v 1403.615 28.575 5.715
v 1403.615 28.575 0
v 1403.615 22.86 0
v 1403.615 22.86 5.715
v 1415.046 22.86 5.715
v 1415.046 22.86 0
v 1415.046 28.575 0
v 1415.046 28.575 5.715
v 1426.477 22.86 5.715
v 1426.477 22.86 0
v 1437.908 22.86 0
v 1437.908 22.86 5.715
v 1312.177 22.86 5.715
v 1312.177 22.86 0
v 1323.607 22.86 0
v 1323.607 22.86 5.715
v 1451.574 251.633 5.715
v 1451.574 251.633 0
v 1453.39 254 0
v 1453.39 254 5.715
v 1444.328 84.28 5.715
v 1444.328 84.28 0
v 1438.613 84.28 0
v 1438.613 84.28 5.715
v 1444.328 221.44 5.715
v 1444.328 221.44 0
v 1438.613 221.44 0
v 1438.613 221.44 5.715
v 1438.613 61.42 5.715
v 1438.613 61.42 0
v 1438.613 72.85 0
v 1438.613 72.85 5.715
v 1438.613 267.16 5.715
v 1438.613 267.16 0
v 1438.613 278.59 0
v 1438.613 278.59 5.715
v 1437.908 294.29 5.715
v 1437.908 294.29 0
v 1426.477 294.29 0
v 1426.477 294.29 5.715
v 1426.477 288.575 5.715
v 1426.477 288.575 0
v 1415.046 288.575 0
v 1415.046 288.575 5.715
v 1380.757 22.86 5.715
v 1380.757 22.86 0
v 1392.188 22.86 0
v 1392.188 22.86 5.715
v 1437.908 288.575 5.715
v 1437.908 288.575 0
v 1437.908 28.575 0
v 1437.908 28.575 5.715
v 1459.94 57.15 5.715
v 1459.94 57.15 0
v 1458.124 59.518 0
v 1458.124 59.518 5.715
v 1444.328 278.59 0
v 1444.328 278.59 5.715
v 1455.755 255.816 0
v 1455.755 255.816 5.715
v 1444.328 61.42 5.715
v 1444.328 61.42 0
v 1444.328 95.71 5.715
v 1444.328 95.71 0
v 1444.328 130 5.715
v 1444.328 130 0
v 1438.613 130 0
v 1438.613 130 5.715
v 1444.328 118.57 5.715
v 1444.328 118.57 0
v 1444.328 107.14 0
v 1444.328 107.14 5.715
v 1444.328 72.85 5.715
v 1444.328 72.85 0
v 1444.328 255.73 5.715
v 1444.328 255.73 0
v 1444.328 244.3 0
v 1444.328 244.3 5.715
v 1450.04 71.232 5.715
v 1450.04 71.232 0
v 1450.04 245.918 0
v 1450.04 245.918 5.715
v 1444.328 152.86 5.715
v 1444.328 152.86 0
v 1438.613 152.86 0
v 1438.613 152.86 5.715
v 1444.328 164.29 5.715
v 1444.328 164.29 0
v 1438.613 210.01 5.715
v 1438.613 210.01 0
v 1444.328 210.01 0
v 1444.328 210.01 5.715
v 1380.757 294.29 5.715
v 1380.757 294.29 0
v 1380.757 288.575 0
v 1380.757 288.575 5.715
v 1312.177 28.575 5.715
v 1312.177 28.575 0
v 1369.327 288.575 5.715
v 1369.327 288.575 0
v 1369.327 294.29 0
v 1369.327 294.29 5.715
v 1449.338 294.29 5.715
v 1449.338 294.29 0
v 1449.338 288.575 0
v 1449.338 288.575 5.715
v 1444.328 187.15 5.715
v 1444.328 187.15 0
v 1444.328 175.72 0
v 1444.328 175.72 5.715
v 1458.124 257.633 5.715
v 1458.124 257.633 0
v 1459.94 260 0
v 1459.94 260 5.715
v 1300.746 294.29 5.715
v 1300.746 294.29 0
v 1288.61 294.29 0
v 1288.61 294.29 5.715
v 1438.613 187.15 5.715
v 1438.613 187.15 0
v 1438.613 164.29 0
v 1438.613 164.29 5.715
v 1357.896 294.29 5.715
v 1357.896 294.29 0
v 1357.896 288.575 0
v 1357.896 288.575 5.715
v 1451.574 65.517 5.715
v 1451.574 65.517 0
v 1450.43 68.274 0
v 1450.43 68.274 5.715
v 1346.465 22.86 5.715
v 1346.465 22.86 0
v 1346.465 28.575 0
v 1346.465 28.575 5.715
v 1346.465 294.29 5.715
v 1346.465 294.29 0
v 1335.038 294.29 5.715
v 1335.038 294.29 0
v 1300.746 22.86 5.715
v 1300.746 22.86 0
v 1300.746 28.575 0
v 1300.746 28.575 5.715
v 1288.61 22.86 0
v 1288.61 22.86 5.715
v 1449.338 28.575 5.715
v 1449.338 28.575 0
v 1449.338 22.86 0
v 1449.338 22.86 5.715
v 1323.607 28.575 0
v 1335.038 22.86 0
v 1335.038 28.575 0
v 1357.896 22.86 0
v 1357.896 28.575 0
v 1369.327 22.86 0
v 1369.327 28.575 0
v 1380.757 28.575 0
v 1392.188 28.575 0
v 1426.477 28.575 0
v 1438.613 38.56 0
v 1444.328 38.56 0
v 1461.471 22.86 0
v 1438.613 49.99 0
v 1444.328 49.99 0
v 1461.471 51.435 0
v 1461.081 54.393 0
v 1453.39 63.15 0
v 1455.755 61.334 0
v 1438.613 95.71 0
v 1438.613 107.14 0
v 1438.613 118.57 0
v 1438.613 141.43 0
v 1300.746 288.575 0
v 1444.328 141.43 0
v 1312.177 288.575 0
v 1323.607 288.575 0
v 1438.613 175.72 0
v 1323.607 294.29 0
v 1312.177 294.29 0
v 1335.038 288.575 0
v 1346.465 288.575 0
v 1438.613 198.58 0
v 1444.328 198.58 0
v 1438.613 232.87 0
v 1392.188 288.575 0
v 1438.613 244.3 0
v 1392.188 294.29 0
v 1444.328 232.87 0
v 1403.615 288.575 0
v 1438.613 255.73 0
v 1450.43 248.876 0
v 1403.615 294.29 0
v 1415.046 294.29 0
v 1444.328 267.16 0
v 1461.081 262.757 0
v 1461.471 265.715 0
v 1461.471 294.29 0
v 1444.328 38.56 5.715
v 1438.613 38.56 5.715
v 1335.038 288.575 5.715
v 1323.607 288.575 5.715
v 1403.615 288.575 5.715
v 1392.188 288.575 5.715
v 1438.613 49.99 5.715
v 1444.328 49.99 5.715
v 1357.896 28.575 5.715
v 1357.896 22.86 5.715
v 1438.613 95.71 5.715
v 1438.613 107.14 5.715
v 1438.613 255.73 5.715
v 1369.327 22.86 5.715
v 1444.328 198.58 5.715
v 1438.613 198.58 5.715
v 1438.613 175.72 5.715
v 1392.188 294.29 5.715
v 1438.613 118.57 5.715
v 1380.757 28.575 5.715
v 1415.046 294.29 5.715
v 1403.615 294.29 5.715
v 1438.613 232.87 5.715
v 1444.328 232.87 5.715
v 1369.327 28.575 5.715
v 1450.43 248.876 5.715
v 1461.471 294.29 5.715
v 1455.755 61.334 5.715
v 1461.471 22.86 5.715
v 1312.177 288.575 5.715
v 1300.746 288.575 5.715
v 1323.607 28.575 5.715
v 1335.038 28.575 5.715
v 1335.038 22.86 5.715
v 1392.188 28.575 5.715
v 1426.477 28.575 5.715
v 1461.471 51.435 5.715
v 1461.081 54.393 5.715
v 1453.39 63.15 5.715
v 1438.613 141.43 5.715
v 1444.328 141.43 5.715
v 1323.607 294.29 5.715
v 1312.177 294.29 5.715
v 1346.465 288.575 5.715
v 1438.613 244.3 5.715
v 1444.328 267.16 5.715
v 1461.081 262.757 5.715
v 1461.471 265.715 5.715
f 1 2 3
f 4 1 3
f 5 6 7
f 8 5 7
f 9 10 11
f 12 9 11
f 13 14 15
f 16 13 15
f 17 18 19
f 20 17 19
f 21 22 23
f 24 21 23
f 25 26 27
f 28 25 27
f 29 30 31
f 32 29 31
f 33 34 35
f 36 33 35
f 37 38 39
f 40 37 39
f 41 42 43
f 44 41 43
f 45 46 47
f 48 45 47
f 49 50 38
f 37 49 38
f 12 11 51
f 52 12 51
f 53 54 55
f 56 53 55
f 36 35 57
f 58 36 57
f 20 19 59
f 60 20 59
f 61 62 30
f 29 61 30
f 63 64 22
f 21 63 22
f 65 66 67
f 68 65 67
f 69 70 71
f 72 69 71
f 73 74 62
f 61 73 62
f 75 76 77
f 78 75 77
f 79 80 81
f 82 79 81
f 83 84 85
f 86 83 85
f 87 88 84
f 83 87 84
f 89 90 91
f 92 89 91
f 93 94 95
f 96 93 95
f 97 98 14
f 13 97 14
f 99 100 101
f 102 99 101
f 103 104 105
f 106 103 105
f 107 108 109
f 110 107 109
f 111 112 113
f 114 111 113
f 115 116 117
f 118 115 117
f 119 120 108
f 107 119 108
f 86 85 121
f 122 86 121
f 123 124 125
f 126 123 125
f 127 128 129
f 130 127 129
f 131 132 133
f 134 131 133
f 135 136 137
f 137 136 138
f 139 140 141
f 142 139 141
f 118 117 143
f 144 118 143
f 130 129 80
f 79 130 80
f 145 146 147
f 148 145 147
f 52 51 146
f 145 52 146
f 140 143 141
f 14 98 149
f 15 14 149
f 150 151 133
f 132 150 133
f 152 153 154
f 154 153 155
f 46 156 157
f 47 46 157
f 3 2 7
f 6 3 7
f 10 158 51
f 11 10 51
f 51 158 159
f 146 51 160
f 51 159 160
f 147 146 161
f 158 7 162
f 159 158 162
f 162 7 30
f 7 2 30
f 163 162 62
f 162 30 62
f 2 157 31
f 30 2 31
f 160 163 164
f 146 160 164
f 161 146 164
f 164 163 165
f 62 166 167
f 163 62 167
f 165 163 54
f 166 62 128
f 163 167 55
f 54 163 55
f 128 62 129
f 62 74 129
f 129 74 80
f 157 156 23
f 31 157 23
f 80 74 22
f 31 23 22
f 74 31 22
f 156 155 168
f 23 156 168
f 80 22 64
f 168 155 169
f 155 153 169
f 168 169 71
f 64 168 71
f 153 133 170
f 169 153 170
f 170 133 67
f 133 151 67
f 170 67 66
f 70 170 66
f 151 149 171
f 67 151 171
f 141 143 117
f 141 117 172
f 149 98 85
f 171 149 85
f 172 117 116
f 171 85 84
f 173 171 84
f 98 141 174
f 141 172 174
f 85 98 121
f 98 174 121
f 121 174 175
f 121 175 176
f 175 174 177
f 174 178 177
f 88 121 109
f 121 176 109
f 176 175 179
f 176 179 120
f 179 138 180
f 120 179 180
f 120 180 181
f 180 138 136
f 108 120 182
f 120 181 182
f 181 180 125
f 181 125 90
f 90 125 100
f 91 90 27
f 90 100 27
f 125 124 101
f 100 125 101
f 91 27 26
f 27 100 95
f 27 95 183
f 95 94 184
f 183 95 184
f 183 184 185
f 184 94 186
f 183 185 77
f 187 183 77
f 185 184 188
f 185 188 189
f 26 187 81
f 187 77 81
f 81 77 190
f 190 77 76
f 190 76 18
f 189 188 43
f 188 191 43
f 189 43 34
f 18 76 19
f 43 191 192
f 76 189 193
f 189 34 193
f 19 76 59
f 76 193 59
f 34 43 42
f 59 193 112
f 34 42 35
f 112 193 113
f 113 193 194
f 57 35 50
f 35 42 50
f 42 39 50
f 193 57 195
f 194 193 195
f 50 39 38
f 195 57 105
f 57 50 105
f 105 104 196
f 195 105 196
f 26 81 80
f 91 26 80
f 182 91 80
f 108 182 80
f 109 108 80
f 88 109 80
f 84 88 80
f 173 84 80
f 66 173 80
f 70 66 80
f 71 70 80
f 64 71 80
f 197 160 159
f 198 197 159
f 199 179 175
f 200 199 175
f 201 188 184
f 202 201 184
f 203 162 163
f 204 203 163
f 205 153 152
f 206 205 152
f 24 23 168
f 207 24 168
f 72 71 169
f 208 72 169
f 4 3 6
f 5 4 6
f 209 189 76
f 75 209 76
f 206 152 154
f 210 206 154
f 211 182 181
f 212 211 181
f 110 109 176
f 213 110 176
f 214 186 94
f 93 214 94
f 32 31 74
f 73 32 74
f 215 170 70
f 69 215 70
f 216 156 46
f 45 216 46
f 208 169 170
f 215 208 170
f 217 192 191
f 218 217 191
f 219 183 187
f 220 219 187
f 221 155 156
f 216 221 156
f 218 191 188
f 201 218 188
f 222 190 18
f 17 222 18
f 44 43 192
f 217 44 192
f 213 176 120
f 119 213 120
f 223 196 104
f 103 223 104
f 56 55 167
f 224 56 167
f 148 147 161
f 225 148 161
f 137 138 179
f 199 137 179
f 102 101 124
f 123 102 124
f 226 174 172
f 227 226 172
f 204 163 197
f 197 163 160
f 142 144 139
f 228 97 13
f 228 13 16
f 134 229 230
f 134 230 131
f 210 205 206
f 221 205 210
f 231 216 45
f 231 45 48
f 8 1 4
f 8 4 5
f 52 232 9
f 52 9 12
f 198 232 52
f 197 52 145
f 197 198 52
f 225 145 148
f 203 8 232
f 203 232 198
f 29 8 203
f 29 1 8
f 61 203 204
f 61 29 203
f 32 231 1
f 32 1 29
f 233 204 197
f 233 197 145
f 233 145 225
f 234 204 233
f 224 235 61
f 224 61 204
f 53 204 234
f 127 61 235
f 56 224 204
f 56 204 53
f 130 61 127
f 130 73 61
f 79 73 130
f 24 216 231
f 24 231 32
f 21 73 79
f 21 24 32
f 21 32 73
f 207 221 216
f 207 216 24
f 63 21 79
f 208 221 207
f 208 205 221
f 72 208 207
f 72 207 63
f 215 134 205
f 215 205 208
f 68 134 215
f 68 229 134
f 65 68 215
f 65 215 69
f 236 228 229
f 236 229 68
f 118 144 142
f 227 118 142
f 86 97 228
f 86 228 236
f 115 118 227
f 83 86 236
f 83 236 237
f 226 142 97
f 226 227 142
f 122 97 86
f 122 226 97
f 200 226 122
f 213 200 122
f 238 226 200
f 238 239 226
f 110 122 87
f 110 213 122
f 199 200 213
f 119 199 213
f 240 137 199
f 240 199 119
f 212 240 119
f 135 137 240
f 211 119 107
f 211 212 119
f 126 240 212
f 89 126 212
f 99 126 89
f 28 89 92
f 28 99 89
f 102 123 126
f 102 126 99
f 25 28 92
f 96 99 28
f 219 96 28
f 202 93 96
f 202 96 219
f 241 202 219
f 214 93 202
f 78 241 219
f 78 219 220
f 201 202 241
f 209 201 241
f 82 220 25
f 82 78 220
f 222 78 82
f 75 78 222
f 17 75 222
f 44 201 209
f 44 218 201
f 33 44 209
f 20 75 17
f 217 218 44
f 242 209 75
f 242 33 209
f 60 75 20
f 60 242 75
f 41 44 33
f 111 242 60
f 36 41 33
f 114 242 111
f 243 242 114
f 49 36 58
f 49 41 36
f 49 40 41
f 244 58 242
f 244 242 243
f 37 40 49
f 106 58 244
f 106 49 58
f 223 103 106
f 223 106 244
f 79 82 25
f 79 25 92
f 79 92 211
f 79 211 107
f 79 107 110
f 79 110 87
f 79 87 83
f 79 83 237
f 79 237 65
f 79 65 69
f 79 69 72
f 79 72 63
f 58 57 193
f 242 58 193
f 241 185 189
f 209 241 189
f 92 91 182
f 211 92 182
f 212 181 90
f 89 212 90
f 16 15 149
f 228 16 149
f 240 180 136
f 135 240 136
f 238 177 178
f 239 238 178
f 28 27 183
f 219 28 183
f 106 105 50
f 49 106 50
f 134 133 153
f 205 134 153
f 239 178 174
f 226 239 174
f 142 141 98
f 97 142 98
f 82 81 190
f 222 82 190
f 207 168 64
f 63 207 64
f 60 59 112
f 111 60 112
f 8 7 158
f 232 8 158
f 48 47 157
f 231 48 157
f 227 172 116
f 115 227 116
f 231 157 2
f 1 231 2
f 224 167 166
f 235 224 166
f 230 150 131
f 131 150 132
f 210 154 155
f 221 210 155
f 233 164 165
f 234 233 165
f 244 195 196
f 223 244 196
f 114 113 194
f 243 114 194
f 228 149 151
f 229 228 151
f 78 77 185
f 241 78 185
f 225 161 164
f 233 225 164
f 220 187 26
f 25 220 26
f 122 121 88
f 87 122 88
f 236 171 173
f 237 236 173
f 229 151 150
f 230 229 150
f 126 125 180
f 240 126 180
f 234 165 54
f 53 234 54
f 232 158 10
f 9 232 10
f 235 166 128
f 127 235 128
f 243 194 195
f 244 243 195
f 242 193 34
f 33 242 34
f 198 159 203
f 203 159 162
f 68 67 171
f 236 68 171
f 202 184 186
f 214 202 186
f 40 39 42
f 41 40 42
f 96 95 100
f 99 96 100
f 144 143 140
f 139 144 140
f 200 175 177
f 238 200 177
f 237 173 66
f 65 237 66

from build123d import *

# Parameters (mm, degrees)
BOSS_EXTRUDE1_DEPTH = 5.715


with BuildPart() as part:
    # Model → Boss-Extrude1 (new body)
    with BuildSketch(Plane.XY):
        Polygon((1288.610132665, 22.860238699), (1300.745973293, 22.860238699), (1300.745973293, 28.575245224), (1312.176695005, 28.575245224), (1312.176695005, 22.860238699), (1323.607416717, 22.860238699), (1323.607416717, 28.575245224), (1335.038138429, 28.575245224), (1335.038138429, 22.860238699), (1346.46531683, 22.860238699), (1346.46531683, 28.575245224), (1357.896038543, 28.575245224), (1357.896038543, 22.860238699), (1369.326760255, 22.860238699), (1369.326760255, 28.575245224), (1380.757481967, 28.575245224), (1380.757481967, 22.860238699), (1392.188203679, 22.860238699), (1392.188203679, 28.575245224), (1403.615382081, 28.575245224), (1403.615382081, 22.860238699), (1415.046103793, 22.860238699), (1415.046103793, 28.575245224), (1426.476825505, 28.575245224), (1426.476825505, 22.860238699), (1437.907547217, 22.860238699), (1437.907547217, 28.575245224), (1449.33826893, 28.575245224), (1449.33826893, 22.860238699), (1461.470566246, 22.860238699), (1461.470566246, 28.575245224), (1461.470566246, 51.435413056), (1461.081244935, 54.393369189), (1459.939855837, 57.150419581), (1458.123908882, 59.517571103), (1455.75520539, 61.334361366), (1453.389602295, 63.150485487), (1451.574098254, 65.517240157), (1450.429608758, 68.274290549), (1450.039844534, 71.232246682), (1450.039844534, 245.918194159), (1450.429608758, 248.876284937), (1451.574098254, 251.633200684), (1453.389602295, 254.00013252), (1455.75520539, 255.816433806), (1458.123908882, 257.633089424), (1459.939855837, 260.000375591), (1461.081244935, 262.757291337), (1461.470566246, 265.715382116), (1461.470566246, 288.575408216), (1461.470566246, 294.290414741), (1449.33826893, 294.290414741), (1449.33826893, 288.575408216), (1437.907547217, 288.575408216), (1437.907547217, 294.290414741), (1426.476825505, 294.290414741), (1426.476825505, 288.575408216), (1415.046103793, 288.575408216), (1415.046103793, 294.290414741), (1403.615382081, 294.290414741), (1403.615382081, 288.575408216), (1392.188203679, 288.575408216), (1392.188203679, 294.290414741), (1380.757481967, 294.290414741), (1380.757481967, 288.575408216), (1369.326760255, 288.575408216), (1369.326760255, 294.290414741), (1357.896038543, 294.290414741), (1357.896038543, 288.575408216), (1346.46531683, 288.575408216), (1346.46531683, 294.290414741), (1335.038138429, 294.290414741), (1335.038138429, 288.575408216), (1323.607416717, 288.575408216), (1323.607416717, 294.290414741), (1312.176695005, 294.290414741), (1312.176695005, 288.575408216), (1300.745973293, 288.575408216), (1300.745973293, 294.290414741), (1288.610132665, 294.290414741), (1288.610132665, 288.575408216), (1288.610132665, 28.575245224), align=None)
        Polygon((1444.328026989, 44.27508992), (1444.328026989, 38.560083395), (1438.612666133, 38.560083395), (1438.612666133, 49.990096445), (1444.328026989, 49.990096445), align=None, mode=Mode.SUBTRACT)
        Polygon((1444.328026989, 67.13511602), (1444.328026989, 61.420109495), (1438.612666133, 61.420109495), (1438.612666133, 72.850122545), (1444.328026989, 72.850122545), align=None, mode=Mode.SUBTRACT)
        Polygon((1444.328026989, 89.99514212), (1444.328026989, 84.280135595), (1438.612666133, 84.280135595), (1438.612666133, 95.710148645), (1444.328026989, 95.710148645), align=None, mode=Mode.SUBTRACT)
        Polygon((1444.328026989, 112.85516822), (1444.328026989, 107.140161695), (1438.612666133, 107.140161695), (1438.612666133, 118.570174745), (1444.328026989, 118.570174745), align=None, mode=Mode.SUBTRACT)
        Polygon((1444.328026989, 135.71519432), (1444.328026989, 130.000187795), (1438.612666133, 130.000187795), (1438.612666133, 141.430200846), (1444.328026989, 141.430200846), align=None, mode=Mode.SUBTRACT)
        Polygon((1444.328026989, 158.575220421), (1444.328026989, 152.860213896), (1438.612666133, 152.860213896), (1438.612666133, 164.290226946), (1444.328026989, 164.290226946), align=None, mode=Mode.SUBTRACT)
        Polygon((1444.328026989, 181.435246521), (1444.328026989, 175.720239996), (1438.612666133, 175.720239996), (1438.612666133, 187.150253046), (1444.328026989, 187.150253046), align=None, mode=Mode.SUBTRACT)
        Polygon((1444.328026989, 204.295272621), (1444.328026989, 198.580266096), (1438.612666133, 198.580266096), (1438.612666133, 210.010279146), (1444.328026989, 210.010279146), align=None, mode=Mode.SUBTRACT)
        Polygon((1444.328026989, 227.155298721), (1444.328026989, 221.440292196), (1438.612666133, 221.440292196), (1438.612666133, 232.870305246), (1444.328026989, 232.870305246), align=None, mode=Mode.SUBTRACT)
        Polygon((1444.328026989, 250.015324821), (1444.328026989, 244.300318296), (1438.612666133, 244.300318296), (1438.612666133, 255.730331346), (1444.328026989, 255.730331346), align=None, mode=Mode.SUBTRACT)
        Polygon((1444.328026989, 272.875350921), (1444.328026989, 267.160344396), (1438.612666133, 267.160344396), (1438.612666133, 278.590357446), (1444.328026989, 278.590357446), align=None, mode=Mode.SUBTRACT)
    extrude(amount=BOSS_EXTRUDE1_DEPTH)


solid = part.part
